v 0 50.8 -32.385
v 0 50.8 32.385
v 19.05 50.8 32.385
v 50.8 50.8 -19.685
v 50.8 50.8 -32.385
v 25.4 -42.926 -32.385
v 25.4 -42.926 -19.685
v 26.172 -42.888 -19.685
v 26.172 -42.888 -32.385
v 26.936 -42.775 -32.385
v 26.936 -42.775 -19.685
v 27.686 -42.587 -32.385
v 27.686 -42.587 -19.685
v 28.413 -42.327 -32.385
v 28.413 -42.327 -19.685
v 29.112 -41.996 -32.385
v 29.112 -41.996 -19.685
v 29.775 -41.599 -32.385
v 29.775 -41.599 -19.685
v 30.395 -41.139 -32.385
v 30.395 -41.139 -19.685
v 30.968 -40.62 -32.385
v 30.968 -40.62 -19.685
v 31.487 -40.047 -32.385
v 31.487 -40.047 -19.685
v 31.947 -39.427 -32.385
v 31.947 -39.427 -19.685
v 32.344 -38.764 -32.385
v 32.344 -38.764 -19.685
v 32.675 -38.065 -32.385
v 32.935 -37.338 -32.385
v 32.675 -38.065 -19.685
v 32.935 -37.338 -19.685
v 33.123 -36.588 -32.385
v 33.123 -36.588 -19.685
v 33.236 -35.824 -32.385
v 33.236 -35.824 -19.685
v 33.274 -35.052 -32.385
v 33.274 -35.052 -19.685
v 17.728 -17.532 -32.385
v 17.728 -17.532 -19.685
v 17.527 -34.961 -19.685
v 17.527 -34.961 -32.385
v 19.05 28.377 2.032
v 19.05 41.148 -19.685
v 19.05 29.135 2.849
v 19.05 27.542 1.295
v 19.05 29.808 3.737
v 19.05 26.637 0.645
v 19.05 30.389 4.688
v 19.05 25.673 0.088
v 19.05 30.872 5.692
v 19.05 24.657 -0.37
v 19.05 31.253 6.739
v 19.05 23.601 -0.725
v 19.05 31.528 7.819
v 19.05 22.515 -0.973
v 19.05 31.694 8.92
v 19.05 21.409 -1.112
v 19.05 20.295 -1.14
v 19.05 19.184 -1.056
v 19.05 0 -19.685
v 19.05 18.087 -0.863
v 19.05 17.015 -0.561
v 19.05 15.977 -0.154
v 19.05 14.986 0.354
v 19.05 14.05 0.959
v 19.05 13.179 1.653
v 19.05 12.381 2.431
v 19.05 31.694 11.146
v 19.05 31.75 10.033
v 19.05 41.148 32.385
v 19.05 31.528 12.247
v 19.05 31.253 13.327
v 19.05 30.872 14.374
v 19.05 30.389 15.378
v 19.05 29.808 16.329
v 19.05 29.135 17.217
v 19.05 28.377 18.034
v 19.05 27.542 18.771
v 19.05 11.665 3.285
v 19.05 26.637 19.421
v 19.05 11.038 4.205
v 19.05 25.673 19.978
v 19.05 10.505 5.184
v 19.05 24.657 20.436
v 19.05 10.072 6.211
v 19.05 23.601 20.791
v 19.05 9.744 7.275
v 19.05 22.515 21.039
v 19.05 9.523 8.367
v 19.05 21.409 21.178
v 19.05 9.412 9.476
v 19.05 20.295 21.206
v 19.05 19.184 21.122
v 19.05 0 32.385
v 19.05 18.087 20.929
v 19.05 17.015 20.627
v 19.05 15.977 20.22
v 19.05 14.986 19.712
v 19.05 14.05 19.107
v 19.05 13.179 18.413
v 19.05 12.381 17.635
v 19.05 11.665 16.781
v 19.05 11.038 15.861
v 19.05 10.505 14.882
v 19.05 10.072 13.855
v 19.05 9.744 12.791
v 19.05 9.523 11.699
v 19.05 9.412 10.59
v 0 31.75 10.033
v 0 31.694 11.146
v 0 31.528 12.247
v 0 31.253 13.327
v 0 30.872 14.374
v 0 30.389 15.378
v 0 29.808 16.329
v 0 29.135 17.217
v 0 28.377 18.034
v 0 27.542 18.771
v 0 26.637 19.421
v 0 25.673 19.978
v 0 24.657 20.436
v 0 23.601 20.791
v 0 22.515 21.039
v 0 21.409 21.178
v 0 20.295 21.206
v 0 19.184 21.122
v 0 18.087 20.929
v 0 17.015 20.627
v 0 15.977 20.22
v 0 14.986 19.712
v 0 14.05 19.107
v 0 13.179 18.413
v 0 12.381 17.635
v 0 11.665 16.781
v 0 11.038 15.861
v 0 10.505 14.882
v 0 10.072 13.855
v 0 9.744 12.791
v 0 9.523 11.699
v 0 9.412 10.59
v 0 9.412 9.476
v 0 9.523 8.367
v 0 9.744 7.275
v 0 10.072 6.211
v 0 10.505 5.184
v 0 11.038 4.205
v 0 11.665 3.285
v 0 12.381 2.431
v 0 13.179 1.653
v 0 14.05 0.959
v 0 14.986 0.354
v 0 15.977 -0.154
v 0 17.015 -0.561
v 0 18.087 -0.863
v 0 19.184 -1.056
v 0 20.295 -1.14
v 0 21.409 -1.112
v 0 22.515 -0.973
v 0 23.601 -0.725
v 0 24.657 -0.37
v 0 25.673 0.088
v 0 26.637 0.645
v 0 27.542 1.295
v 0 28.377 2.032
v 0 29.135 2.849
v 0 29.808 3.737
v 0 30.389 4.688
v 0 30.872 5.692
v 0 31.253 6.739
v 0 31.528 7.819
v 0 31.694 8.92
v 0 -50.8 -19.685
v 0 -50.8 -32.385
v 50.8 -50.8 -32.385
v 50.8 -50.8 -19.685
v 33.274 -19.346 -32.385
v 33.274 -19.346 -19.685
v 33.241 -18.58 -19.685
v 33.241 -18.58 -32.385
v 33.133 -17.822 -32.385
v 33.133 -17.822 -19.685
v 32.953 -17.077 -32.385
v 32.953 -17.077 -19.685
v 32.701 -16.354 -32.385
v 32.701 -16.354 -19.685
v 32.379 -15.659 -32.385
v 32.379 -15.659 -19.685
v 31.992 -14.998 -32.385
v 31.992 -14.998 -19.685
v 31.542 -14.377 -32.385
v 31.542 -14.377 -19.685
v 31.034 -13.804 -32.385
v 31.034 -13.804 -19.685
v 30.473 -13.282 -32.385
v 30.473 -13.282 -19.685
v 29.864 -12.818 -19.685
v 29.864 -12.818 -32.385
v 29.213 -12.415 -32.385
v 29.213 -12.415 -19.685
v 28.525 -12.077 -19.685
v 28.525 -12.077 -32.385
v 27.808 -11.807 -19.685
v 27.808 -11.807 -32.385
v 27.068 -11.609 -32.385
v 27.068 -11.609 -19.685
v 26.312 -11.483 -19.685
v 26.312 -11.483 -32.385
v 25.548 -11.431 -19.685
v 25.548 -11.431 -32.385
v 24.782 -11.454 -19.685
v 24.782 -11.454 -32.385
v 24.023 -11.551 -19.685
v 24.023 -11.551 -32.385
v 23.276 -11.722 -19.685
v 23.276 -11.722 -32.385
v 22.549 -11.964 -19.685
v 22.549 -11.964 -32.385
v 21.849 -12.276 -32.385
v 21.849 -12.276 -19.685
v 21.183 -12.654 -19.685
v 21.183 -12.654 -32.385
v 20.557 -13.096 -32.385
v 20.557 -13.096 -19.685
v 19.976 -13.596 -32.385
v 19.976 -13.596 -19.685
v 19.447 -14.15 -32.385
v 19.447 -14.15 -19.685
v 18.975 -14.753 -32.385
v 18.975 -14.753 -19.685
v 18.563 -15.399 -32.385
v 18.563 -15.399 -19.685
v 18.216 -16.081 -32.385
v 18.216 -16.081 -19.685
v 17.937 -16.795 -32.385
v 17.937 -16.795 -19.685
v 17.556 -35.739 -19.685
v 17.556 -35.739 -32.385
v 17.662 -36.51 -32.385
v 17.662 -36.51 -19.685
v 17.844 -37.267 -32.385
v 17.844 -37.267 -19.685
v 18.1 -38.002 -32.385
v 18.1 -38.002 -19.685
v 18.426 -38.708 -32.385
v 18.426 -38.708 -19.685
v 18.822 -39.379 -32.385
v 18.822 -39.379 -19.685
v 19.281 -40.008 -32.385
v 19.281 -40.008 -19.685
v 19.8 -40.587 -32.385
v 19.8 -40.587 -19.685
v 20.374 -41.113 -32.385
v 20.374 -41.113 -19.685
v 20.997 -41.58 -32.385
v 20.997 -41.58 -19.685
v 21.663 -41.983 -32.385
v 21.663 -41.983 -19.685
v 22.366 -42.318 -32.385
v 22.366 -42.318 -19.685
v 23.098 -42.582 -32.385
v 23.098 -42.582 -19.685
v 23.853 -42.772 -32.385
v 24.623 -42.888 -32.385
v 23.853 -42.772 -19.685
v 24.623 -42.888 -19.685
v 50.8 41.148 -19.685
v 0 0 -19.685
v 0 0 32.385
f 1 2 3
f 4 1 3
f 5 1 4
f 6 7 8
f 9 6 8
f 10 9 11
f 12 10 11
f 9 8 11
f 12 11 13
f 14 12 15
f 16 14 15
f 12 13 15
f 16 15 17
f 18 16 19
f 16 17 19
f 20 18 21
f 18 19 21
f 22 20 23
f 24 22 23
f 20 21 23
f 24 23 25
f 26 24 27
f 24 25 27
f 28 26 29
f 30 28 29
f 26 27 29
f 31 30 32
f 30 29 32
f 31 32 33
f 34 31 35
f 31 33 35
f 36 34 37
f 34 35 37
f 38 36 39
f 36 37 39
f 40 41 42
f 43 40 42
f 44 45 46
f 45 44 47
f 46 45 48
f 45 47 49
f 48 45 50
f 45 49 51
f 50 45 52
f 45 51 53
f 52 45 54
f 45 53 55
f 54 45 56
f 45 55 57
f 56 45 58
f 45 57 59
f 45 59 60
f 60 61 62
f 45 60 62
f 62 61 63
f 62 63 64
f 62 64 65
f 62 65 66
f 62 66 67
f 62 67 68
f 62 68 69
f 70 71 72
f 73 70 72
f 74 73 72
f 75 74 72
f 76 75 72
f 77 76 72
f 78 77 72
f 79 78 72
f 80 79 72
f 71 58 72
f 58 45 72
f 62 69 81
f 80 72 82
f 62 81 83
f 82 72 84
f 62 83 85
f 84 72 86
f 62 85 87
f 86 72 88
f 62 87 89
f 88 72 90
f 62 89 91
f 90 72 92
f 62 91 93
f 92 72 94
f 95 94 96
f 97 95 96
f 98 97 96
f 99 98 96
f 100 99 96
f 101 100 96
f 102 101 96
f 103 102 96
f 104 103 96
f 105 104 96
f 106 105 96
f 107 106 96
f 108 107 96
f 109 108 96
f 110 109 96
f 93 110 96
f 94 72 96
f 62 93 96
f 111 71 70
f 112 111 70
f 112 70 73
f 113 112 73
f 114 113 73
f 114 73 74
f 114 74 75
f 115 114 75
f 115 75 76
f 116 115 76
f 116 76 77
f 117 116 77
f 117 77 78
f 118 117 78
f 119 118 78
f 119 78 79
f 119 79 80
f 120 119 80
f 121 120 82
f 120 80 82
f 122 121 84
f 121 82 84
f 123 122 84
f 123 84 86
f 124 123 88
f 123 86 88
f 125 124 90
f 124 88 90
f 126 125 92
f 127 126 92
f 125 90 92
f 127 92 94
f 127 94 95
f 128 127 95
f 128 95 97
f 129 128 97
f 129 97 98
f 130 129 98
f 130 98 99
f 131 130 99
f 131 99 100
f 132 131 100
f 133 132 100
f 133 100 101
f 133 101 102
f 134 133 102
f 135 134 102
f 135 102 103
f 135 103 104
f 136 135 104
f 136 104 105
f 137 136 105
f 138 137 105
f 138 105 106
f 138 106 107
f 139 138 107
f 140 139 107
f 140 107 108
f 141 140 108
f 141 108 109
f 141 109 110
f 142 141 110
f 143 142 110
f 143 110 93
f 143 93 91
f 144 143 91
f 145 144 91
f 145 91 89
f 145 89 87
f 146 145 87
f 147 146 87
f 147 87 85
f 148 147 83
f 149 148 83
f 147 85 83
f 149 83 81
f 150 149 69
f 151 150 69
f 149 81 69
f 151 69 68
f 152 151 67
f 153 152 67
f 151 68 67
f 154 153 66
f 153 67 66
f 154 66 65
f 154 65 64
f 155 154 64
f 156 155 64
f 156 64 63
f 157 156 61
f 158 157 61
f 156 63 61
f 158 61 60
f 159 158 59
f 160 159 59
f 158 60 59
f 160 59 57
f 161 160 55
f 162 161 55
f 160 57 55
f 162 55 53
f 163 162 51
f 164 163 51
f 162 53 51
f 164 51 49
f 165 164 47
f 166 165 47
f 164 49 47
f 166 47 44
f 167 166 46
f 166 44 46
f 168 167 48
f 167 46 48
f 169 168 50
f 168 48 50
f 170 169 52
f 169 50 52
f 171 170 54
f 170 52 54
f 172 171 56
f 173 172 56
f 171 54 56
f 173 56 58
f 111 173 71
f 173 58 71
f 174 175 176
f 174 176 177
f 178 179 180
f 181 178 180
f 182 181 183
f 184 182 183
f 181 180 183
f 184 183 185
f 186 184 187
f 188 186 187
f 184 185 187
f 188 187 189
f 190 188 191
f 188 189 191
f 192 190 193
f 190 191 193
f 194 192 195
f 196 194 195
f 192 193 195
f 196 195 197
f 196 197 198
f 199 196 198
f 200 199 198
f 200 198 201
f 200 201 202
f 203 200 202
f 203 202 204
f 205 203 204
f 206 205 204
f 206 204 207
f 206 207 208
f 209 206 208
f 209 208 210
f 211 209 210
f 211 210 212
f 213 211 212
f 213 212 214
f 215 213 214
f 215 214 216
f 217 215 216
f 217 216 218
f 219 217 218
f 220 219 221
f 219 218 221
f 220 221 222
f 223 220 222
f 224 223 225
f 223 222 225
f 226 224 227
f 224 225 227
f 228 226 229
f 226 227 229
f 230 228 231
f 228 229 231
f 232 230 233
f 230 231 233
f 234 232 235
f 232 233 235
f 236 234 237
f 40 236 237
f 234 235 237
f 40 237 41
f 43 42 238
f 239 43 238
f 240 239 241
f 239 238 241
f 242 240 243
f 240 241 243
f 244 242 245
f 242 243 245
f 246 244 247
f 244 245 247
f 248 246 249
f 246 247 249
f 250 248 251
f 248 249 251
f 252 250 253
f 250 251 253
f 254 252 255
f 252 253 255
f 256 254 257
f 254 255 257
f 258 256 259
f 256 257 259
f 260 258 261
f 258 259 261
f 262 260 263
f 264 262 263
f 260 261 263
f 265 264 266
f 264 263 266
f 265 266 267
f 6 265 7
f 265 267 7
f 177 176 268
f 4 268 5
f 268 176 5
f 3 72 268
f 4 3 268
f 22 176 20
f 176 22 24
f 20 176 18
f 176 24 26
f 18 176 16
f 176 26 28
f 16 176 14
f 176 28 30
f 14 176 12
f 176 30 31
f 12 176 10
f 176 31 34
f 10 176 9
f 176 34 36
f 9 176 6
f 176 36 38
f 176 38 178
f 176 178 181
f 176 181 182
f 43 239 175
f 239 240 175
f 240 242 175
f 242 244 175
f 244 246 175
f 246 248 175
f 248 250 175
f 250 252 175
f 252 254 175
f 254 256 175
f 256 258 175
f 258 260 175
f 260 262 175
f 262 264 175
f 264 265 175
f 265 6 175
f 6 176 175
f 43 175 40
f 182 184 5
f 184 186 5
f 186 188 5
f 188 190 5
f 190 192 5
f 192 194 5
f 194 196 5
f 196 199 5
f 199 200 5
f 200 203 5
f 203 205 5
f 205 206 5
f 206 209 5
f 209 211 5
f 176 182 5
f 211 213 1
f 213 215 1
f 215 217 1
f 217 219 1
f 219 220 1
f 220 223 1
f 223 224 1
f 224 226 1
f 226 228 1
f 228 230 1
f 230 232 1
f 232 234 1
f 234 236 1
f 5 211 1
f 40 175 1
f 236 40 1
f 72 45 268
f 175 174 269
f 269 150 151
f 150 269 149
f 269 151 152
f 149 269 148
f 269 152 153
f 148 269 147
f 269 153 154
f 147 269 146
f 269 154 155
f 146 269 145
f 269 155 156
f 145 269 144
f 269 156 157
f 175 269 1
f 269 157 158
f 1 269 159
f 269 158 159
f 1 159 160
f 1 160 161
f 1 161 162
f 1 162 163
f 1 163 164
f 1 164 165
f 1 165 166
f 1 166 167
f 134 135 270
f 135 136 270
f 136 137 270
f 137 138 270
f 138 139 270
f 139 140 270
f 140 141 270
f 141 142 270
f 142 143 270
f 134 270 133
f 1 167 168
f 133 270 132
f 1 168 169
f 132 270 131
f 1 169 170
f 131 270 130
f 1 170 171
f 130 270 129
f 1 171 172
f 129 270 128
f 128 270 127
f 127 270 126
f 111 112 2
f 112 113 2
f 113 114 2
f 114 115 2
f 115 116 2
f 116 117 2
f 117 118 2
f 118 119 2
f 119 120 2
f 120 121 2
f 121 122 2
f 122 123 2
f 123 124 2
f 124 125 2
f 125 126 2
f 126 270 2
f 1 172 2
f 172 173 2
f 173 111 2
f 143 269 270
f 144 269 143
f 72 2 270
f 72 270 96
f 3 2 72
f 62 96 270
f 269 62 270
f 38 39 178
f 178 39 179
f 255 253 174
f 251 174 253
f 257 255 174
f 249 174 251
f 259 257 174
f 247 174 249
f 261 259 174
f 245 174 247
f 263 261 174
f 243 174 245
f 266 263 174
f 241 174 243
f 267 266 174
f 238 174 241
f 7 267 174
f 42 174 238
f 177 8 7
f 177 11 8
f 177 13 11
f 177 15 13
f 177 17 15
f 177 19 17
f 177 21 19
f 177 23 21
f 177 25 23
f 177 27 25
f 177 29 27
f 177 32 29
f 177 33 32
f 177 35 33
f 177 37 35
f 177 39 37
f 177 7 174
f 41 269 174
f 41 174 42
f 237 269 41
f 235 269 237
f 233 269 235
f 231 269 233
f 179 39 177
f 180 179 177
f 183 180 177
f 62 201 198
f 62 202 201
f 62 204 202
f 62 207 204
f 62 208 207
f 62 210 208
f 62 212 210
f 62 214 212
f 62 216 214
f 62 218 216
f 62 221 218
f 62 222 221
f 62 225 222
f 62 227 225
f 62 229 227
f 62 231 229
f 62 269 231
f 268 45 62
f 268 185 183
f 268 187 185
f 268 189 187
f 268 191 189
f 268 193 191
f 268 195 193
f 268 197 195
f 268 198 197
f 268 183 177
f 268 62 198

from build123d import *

# Parameters (mm, degrees)
F0_W      = 101.6
F0_H      = 64.77
F1_DEPTH  = 50.8
F3_DEPTH  = 52.07
F4_R      = 11.176
F5_DEPTH  = 19.051
F6_W      = 31.75
F6_H      = 9.652
F7_DEPTH  = 52.07
F9_DEPTH  = 9.653
F11_DEPTH = 12.701


with BuildPart() as f1:
    # F0 (on Right) → F1 (new body)
    with BuildSketch(Plane.YZ):
        Rectangle(F0_W, F0_H)
    extrude(amount=F1_DEPTH)

    # F2 (on face) → F3 (cut)
    with BuildSketch(Plane.XY.offset(32.385)):
        Polygon((19.05, 0), (0, 0), (0, -50.8), (50.8, -50.8), (50.8, 50.8), (19.05, 50.8), align=None)
    extrude(amount=-F3_DEPTH, mode=Mode.SUBTRACT)

    # F4 (on face) → F5 (cut, through all)
    with BuildSketch(Plane.YZ.offset(19.05)):
        with Locations((20.574, 10.033)):
            Circle(F4_R)
    extrude(amount=-F5_DEPTH, mode=Mode.SUBTRACT)

    # F6 (on face) → F7 (join)
    with BuildSketch(Plane.XY.offset(-19.685)):
        with Locations((34.925, 45.974)):
            Rectangle(F6_W, F6_H)
    extrude(amount=F7_DEPTH)

    # F8 (on face) → F9 (cut, through all)
    with BuildSketch(Plane.XZ.offset(-41.148)):
        Polygon((50.8, 32.385), (19.05, 32.385), (50.8, -19.685), align=None)
    extrude(amount=-F9_DEPTH, mode=Mode.SUBTRACT)

    # F10 (on face) → F11 (cut, through all)
    with BuildSketch(Plane.XY.offset(-19.685)):
        with BuildLine():
            Line((17.727991, -17.53195), (17.526526, -34.960989))
            ThreePointArc((17.526526, -34.960989), (19.800156, -40.587488), (25.4, -42.926))
            ThreePointArc((25.4, -42.926), (30.967778, -40.619739), (33.274, -35.051945))
            Line((33.274, -35.051945), (33.27389, -19.345712))
            ThreePointArc((33.27389, -19.345712), (26.312481, -11.48305), (17.727991, -17.53195))
        make_face()
    extrude(amount=-F11_DEPTH, mode=Mode.SUBTRACT)


solid = f1.part
